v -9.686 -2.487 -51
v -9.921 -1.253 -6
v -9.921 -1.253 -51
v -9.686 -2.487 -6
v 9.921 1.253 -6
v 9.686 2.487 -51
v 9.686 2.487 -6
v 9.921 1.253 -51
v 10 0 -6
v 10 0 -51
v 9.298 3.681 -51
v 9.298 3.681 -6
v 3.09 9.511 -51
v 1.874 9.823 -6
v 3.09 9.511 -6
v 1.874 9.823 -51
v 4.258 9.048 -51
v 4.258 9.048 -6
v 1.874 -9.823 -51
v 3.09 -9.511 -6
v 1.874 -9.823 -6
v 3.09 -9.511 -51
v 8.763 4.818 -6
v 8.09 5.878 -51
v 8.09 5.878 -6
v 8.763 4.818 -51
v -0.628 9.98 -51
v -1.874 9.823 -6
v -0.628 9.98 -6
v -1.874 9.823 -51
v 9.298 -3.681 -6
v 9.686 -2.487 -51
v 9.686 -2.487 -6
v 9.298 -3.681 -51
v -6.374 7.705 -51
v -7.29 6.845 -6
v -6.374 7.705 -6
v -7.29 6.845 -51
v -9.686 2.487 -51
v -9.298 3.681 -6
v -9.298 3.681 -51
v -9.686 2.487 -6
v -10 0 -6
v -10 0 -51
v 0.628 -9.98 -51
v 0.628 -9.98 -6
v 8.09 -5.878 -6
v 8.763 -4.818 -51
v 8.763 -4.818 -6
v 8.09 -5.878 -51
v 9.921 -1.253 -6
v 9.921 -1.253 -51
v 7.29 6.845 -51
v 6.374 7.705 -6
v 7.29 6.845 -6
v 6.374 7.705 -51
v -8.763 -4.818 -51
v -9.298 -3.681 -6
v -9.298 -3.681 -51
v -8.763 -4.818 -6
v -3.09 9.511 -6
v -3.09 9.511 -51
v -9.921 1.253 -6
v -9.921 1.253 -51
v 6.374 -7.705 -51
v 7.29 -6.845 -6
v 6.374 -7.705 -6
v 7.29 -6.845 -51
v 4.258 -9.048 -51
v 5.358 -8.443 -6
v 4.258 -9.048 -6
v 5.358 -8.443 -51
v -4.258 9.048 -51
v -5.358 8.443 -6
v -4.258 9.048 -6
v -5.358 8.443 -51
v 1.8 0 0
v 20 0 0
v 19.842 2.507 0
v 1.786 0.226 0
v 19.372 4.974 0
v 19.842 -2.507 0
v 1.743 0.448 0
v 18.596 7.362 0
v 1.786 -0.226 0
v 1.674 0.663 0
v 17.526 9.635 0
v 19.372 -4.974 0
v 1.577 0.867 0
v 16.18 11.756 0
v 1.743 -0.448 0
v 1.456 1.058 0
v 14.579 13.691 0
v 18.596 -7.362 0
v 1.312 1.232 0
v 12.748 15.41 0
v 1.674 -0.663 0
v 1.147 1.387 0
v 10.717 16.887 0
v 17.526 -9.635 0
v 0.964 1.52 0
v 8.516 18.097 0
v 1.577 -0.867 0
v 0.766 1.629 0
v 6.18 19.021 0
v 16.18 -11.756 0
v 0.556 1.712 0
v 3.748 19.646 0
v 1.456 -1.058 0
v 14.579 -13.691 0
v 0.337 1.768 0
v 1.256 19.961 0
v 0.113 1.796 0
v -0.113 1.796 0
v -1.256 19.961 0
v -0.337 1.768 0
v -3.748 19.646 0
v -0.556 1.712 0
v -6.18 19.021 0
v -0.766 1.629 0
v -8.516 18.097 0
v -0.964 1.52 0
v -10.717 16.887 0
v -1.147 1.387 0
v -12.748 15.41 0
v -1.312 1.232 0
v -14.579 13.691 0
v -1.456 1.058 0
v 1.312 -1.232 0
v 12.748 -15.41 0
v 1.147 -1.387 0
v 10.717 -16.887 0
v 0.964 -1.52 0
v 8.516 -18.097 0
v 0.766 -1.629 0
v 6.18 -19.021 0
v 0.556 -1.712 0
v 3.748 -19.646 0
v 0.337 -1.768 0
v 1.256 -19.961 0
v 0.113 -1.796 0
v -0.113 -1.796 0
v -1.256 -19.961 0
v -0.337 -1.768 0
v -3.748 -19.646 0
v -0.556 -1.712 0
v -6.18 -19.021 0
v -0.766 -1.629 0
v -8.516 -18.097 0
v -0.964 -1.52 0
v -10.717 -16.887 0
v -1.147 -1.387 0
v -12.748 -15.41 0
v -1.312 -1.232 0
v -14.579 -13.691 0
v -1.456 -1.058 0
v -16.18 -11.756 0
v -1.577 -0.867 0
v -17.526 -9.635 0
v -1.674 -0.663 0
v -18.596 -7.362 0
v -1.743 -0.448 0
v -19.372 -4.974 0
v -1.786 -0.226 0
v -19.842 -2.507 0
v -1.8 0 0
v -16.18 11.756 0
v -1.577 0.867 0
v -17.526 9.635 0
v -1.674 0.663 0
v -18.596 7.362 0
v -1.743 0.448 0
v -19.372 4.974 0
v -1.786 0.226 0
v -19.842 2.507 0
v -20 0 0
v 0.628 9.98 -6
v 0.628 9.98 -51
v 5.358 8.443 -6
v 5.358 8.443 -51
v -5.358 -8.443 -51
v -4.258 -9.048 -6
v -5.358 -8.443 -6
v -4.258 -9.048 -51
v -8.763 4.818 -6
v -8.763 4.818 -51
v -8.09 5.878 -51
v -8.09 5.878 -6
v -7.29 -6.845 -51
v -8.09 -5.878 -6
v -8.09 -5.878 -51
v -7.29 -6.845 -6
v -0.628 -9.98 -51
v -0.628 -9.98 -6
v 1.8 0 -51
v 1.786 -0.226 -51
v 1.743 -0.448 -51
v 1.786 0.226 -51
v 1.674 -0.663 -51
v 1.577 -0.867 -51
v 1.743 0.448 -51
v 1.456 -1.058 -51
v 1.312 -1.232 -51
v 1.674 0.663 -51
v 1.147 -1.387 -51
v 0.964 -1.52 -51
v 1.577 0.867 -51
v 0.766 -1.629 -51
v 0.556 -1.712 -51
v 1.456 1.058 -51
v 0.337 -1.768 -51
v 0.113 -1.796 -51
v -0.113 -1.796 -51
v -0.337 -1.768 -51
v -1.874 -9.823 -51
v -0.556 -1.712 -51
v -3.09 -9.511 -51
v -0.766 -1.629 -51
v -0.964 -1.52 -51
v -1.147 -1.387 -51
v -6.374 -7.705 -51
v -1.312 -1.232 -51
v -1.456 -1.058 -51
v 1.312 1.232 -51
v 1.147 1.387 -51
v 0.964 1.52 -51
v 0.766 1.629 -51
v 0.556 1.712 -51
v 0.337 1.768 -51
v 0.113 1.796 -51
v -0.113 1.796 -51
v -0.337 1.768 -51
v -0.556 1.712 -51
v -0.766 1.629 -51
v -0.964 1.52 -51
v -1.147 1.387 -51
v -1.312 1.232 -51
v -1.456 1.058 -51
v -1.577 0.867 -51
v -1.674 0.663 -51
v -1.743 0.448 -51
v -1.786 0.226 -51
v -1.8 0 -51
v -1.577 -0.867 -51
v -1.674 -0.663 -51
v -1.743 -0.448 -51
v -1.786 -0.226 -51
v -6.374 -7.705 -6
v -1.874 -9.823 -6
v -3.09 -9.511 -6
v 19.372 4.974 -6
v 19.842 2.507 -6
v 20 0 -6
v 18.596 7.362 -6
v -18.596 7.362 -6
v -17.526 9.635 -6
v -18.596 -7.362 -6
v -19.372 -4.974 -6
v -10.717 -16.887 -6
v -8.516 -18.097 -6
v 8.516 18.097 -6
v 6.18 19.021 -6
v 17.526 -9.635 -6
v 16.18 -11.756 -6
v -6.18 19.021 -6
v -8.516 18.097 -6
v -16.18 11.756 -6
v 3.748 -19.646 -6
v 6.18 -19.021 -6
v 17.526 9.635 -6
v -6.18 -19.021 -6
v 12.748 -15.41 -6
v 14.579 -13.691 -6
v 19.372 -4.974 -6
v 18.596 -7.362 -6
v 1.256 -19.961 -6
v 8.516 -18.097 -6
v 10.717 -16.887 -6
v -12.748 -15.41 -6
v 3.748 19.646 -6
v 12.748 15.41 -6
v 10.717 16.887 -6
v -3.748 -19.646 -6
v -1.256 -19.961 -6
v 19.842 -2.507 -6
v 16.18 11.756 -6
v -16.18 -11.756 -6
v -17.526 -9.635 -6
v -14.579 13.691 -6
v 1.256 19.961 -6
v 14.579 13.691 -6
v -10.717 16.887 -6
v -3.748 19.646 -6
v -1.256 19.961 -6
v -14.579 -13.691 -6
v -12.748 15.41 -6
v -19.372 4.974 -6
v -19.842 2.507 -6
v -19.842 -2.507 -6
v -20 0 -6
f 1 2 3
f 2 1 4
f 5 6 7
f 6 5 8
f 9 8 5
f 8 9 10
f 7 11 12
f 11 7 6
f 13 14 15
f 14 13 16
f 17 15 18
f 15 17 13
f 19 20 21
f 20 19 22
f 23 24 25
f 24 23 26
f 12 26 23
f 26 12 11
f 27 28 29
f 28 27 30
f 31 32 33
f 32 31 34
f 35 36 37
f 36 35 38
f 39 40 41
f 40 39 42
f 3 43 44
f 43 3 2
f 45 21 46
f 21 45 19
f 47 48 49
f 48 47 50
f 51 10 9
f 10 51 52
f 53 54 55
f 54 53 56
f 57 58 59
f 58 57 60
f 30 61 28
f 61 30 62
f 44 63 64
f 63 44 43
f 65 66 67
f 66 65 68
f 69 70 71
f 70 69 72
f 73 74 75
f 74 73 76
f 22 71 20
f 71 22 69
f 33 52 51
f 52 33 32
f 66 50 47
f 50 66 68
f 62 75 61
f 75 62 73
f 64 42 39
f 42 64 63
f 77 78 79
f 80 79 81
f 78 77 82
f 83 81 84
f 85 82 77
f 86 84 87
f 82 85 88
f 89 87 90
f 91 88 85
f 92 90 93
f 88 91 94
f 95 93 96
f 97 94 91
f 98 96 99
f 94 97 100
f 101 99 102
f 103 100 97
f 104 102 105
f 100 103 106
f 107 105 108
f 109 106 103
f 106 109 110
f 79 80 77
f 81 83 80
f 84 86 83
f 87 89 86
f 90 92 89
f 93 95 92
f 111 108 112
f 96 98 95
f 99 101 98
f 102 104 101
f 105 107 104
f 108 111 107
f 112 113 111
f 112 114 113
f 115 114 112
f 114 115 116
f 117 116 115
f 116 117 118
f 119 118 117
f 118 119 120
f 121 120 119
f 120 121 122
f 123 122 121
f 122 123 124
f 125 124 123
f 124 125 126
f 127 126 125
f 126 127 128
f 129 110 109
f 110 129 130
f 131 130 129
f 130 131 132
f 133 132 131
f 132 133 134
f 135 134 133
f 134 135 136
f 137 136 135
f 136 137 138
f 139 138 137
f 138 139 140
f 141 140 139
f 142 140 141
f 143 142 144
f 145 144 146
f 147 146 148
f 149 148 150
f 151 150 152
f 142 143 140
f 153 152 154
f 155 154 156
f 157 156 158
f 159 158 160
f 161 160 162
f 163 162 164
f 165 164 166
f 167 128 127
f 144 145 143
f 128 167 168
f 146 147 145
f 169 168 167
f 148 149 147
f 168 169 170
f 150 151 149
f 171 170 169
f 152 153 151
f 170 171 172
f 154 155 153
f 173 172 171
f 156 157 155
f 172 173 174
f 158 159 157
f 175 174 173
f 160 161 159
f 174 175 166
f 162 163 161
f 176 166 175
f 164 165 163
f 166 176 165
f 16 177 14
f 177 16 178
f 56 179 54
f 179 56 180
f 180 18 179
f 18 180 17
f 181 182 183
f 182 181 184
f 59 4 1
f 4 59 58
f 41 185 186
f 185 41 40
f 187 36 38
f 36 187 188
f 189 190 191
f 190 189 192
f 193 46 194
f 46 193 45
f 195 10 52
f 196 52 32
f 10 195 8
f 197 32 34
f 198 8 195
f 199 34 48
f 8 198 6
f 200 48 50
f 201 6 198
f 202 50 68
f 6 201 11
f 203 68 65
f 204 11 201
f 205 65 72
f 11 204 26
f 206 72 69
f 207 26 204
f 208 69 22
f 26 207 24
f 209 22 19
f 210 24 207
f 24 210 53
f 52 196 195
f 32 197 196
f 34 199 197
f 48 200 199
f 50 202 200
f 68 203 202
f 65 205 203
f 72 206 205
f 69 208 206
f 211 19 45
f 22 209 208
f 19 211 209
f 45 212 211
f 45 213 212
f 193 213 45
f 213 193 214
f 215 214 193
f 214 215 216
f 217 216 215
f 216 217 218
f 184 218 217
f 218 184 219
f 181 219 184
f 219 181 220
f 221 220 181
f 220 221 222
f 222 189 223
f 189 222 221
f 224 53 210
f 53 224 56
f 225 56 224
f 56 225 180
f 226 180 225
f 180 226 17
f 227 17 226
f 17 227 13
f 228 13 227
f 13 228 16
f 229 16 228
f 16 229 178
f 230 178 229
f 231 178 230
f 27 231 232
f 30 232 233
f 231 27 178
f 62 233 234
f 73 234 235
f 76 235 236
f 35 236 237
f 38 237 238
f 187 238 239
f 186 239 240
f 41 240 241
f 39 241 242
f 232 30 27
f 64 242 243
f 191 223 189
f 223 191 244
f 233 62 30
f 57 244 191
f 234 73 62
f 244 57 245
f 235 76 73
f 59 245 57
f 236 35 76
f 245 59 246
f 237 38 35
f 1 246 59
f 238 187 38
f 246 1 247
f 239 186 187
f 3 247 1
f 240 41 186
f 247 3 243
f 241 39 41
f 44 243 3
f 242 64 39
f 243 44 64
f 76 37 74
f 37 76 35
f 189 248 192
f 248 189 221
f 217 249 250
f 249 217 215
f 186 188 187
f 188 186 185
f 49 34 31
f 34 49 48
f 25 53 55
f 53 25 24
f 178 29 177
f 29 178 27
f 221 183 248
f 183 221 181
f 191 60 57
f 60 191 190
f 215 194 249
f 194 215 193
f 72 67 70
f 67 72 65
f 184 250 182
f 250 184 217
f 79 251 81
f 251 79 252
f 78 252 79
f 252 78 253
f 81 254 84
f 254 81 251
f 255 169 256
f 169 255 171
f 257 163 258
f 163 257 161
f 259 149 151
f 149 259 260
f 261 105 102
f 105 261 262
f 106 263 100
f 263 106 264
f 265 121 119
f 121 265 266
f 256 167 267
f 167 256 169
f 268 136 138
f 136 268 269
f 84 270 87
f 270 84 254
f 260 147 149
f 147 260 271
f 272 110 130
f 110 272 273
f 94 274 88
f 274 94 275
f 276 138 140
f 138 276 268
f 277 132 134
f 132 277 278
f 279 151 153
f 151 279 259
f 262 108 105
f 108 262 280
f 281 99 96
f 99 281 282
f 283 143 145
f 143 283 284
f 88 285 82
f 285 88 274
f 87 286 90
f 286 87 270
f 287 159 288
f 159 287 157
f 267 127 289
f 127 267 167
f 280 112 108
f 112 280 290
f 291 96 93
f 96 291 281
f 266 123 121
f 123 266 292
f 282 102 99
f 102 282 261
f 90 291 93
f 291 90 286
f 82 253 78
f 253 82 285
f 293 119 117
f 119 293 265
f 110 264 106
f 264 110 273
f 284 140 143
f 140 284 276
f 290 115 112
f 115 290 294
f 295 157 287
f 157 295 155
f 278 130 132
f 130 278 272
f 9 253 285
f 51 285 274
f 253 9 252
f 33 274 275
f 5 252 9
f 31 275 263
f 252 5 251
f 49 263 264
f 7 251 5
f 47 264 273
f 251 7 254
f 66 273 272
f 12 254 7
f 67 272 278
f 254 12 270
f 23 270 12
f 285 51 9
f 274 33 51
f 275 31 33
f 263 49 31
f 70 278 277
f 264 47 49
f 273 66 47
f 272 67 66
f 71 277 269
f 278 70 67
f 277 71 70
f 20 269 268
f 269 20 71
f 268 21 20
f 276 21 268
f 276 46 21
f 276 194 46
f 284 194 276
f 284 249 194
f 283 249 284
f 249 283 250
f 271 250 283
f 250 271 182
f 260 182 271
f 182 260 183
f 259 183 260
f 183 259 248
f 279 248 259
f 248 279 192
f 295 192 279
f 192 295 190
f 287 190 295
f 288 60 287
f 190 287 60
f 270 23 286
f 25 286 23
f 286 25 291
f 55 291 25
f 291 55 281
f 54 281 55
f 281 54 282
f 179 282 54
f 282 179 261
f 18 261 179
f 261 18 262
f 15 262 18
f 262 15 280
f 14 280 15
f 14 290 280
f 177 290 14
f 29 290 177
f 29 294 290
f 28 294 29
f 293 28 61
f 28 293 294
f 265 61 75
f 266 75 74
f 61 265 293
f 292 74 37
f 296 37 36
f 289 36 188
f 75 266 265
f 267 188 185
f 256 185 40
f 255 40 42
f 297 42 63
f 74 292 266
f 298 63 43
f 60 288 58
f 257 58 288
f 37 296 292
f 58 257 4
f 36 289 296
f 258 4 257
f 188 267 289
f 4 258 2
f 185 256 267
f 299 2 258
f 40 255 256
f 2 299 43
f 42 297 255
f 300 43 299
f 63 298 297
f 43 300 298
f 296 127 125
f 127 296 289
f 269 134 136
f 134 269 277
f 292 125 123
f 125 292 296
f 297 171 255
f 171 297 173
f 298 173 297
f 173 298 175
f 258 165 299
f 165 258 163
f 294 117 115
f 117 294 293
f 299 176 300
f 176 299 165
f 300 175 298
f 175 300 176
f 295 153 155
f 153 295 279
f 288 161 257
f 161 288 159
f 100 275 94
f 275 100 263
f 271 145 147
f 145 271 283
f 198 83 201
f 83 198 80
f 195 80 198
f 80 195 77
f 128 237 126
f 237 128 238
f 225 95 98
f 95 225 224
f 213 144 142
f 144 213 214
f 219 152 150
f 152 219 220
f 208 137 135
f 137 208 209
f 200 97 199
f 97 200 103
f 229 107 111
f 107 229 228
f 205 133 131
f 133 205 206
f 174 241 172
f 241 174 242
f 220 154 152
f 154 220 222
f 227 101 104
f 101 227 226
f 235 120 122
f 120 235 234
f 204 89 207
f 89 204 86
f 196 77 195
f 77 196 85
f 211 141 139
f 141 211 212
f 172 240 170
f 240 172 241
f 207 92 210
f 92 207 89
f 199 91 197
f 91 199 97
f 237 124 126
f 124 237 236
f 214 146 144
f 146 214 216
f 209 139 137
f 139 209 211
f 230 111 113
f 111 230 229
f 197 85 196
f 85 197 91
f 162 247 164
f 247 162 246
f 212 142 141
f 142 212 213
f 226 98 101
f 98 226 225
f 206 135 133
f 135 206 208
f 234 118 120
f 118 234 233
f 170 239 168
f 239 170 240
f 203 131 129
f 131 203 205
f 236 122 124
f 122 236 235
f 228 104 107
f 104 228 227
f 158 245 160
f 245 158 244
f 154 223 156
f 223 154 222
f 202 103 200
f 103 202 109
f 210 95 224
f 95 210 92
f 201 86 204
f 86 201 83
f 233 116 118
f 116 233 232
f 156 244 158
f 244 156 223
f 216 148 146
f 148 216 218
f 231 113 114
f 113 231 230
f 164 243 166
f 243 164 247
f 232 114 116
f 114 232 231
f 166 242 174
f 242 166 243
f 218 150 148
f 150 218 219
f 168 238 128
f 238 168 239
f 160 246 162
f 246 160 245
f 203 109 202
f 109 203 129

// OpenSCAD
$fn = 50;


difference() {
	union() {
		translate(v = [0, 0, -51.0000000000]) {
			cylinder(h = 51, r = 10.0000000000);
		}
		translate(v = [0, 0, -6.0000000000]) {
			cylinder(h = 6, r = 20.0000000000);
		}
	}
	union() {
		#translate(v = [0, 0, -51]) {
			cylinder(h = 51, r = 1.8000000000);
		}
	}
}
